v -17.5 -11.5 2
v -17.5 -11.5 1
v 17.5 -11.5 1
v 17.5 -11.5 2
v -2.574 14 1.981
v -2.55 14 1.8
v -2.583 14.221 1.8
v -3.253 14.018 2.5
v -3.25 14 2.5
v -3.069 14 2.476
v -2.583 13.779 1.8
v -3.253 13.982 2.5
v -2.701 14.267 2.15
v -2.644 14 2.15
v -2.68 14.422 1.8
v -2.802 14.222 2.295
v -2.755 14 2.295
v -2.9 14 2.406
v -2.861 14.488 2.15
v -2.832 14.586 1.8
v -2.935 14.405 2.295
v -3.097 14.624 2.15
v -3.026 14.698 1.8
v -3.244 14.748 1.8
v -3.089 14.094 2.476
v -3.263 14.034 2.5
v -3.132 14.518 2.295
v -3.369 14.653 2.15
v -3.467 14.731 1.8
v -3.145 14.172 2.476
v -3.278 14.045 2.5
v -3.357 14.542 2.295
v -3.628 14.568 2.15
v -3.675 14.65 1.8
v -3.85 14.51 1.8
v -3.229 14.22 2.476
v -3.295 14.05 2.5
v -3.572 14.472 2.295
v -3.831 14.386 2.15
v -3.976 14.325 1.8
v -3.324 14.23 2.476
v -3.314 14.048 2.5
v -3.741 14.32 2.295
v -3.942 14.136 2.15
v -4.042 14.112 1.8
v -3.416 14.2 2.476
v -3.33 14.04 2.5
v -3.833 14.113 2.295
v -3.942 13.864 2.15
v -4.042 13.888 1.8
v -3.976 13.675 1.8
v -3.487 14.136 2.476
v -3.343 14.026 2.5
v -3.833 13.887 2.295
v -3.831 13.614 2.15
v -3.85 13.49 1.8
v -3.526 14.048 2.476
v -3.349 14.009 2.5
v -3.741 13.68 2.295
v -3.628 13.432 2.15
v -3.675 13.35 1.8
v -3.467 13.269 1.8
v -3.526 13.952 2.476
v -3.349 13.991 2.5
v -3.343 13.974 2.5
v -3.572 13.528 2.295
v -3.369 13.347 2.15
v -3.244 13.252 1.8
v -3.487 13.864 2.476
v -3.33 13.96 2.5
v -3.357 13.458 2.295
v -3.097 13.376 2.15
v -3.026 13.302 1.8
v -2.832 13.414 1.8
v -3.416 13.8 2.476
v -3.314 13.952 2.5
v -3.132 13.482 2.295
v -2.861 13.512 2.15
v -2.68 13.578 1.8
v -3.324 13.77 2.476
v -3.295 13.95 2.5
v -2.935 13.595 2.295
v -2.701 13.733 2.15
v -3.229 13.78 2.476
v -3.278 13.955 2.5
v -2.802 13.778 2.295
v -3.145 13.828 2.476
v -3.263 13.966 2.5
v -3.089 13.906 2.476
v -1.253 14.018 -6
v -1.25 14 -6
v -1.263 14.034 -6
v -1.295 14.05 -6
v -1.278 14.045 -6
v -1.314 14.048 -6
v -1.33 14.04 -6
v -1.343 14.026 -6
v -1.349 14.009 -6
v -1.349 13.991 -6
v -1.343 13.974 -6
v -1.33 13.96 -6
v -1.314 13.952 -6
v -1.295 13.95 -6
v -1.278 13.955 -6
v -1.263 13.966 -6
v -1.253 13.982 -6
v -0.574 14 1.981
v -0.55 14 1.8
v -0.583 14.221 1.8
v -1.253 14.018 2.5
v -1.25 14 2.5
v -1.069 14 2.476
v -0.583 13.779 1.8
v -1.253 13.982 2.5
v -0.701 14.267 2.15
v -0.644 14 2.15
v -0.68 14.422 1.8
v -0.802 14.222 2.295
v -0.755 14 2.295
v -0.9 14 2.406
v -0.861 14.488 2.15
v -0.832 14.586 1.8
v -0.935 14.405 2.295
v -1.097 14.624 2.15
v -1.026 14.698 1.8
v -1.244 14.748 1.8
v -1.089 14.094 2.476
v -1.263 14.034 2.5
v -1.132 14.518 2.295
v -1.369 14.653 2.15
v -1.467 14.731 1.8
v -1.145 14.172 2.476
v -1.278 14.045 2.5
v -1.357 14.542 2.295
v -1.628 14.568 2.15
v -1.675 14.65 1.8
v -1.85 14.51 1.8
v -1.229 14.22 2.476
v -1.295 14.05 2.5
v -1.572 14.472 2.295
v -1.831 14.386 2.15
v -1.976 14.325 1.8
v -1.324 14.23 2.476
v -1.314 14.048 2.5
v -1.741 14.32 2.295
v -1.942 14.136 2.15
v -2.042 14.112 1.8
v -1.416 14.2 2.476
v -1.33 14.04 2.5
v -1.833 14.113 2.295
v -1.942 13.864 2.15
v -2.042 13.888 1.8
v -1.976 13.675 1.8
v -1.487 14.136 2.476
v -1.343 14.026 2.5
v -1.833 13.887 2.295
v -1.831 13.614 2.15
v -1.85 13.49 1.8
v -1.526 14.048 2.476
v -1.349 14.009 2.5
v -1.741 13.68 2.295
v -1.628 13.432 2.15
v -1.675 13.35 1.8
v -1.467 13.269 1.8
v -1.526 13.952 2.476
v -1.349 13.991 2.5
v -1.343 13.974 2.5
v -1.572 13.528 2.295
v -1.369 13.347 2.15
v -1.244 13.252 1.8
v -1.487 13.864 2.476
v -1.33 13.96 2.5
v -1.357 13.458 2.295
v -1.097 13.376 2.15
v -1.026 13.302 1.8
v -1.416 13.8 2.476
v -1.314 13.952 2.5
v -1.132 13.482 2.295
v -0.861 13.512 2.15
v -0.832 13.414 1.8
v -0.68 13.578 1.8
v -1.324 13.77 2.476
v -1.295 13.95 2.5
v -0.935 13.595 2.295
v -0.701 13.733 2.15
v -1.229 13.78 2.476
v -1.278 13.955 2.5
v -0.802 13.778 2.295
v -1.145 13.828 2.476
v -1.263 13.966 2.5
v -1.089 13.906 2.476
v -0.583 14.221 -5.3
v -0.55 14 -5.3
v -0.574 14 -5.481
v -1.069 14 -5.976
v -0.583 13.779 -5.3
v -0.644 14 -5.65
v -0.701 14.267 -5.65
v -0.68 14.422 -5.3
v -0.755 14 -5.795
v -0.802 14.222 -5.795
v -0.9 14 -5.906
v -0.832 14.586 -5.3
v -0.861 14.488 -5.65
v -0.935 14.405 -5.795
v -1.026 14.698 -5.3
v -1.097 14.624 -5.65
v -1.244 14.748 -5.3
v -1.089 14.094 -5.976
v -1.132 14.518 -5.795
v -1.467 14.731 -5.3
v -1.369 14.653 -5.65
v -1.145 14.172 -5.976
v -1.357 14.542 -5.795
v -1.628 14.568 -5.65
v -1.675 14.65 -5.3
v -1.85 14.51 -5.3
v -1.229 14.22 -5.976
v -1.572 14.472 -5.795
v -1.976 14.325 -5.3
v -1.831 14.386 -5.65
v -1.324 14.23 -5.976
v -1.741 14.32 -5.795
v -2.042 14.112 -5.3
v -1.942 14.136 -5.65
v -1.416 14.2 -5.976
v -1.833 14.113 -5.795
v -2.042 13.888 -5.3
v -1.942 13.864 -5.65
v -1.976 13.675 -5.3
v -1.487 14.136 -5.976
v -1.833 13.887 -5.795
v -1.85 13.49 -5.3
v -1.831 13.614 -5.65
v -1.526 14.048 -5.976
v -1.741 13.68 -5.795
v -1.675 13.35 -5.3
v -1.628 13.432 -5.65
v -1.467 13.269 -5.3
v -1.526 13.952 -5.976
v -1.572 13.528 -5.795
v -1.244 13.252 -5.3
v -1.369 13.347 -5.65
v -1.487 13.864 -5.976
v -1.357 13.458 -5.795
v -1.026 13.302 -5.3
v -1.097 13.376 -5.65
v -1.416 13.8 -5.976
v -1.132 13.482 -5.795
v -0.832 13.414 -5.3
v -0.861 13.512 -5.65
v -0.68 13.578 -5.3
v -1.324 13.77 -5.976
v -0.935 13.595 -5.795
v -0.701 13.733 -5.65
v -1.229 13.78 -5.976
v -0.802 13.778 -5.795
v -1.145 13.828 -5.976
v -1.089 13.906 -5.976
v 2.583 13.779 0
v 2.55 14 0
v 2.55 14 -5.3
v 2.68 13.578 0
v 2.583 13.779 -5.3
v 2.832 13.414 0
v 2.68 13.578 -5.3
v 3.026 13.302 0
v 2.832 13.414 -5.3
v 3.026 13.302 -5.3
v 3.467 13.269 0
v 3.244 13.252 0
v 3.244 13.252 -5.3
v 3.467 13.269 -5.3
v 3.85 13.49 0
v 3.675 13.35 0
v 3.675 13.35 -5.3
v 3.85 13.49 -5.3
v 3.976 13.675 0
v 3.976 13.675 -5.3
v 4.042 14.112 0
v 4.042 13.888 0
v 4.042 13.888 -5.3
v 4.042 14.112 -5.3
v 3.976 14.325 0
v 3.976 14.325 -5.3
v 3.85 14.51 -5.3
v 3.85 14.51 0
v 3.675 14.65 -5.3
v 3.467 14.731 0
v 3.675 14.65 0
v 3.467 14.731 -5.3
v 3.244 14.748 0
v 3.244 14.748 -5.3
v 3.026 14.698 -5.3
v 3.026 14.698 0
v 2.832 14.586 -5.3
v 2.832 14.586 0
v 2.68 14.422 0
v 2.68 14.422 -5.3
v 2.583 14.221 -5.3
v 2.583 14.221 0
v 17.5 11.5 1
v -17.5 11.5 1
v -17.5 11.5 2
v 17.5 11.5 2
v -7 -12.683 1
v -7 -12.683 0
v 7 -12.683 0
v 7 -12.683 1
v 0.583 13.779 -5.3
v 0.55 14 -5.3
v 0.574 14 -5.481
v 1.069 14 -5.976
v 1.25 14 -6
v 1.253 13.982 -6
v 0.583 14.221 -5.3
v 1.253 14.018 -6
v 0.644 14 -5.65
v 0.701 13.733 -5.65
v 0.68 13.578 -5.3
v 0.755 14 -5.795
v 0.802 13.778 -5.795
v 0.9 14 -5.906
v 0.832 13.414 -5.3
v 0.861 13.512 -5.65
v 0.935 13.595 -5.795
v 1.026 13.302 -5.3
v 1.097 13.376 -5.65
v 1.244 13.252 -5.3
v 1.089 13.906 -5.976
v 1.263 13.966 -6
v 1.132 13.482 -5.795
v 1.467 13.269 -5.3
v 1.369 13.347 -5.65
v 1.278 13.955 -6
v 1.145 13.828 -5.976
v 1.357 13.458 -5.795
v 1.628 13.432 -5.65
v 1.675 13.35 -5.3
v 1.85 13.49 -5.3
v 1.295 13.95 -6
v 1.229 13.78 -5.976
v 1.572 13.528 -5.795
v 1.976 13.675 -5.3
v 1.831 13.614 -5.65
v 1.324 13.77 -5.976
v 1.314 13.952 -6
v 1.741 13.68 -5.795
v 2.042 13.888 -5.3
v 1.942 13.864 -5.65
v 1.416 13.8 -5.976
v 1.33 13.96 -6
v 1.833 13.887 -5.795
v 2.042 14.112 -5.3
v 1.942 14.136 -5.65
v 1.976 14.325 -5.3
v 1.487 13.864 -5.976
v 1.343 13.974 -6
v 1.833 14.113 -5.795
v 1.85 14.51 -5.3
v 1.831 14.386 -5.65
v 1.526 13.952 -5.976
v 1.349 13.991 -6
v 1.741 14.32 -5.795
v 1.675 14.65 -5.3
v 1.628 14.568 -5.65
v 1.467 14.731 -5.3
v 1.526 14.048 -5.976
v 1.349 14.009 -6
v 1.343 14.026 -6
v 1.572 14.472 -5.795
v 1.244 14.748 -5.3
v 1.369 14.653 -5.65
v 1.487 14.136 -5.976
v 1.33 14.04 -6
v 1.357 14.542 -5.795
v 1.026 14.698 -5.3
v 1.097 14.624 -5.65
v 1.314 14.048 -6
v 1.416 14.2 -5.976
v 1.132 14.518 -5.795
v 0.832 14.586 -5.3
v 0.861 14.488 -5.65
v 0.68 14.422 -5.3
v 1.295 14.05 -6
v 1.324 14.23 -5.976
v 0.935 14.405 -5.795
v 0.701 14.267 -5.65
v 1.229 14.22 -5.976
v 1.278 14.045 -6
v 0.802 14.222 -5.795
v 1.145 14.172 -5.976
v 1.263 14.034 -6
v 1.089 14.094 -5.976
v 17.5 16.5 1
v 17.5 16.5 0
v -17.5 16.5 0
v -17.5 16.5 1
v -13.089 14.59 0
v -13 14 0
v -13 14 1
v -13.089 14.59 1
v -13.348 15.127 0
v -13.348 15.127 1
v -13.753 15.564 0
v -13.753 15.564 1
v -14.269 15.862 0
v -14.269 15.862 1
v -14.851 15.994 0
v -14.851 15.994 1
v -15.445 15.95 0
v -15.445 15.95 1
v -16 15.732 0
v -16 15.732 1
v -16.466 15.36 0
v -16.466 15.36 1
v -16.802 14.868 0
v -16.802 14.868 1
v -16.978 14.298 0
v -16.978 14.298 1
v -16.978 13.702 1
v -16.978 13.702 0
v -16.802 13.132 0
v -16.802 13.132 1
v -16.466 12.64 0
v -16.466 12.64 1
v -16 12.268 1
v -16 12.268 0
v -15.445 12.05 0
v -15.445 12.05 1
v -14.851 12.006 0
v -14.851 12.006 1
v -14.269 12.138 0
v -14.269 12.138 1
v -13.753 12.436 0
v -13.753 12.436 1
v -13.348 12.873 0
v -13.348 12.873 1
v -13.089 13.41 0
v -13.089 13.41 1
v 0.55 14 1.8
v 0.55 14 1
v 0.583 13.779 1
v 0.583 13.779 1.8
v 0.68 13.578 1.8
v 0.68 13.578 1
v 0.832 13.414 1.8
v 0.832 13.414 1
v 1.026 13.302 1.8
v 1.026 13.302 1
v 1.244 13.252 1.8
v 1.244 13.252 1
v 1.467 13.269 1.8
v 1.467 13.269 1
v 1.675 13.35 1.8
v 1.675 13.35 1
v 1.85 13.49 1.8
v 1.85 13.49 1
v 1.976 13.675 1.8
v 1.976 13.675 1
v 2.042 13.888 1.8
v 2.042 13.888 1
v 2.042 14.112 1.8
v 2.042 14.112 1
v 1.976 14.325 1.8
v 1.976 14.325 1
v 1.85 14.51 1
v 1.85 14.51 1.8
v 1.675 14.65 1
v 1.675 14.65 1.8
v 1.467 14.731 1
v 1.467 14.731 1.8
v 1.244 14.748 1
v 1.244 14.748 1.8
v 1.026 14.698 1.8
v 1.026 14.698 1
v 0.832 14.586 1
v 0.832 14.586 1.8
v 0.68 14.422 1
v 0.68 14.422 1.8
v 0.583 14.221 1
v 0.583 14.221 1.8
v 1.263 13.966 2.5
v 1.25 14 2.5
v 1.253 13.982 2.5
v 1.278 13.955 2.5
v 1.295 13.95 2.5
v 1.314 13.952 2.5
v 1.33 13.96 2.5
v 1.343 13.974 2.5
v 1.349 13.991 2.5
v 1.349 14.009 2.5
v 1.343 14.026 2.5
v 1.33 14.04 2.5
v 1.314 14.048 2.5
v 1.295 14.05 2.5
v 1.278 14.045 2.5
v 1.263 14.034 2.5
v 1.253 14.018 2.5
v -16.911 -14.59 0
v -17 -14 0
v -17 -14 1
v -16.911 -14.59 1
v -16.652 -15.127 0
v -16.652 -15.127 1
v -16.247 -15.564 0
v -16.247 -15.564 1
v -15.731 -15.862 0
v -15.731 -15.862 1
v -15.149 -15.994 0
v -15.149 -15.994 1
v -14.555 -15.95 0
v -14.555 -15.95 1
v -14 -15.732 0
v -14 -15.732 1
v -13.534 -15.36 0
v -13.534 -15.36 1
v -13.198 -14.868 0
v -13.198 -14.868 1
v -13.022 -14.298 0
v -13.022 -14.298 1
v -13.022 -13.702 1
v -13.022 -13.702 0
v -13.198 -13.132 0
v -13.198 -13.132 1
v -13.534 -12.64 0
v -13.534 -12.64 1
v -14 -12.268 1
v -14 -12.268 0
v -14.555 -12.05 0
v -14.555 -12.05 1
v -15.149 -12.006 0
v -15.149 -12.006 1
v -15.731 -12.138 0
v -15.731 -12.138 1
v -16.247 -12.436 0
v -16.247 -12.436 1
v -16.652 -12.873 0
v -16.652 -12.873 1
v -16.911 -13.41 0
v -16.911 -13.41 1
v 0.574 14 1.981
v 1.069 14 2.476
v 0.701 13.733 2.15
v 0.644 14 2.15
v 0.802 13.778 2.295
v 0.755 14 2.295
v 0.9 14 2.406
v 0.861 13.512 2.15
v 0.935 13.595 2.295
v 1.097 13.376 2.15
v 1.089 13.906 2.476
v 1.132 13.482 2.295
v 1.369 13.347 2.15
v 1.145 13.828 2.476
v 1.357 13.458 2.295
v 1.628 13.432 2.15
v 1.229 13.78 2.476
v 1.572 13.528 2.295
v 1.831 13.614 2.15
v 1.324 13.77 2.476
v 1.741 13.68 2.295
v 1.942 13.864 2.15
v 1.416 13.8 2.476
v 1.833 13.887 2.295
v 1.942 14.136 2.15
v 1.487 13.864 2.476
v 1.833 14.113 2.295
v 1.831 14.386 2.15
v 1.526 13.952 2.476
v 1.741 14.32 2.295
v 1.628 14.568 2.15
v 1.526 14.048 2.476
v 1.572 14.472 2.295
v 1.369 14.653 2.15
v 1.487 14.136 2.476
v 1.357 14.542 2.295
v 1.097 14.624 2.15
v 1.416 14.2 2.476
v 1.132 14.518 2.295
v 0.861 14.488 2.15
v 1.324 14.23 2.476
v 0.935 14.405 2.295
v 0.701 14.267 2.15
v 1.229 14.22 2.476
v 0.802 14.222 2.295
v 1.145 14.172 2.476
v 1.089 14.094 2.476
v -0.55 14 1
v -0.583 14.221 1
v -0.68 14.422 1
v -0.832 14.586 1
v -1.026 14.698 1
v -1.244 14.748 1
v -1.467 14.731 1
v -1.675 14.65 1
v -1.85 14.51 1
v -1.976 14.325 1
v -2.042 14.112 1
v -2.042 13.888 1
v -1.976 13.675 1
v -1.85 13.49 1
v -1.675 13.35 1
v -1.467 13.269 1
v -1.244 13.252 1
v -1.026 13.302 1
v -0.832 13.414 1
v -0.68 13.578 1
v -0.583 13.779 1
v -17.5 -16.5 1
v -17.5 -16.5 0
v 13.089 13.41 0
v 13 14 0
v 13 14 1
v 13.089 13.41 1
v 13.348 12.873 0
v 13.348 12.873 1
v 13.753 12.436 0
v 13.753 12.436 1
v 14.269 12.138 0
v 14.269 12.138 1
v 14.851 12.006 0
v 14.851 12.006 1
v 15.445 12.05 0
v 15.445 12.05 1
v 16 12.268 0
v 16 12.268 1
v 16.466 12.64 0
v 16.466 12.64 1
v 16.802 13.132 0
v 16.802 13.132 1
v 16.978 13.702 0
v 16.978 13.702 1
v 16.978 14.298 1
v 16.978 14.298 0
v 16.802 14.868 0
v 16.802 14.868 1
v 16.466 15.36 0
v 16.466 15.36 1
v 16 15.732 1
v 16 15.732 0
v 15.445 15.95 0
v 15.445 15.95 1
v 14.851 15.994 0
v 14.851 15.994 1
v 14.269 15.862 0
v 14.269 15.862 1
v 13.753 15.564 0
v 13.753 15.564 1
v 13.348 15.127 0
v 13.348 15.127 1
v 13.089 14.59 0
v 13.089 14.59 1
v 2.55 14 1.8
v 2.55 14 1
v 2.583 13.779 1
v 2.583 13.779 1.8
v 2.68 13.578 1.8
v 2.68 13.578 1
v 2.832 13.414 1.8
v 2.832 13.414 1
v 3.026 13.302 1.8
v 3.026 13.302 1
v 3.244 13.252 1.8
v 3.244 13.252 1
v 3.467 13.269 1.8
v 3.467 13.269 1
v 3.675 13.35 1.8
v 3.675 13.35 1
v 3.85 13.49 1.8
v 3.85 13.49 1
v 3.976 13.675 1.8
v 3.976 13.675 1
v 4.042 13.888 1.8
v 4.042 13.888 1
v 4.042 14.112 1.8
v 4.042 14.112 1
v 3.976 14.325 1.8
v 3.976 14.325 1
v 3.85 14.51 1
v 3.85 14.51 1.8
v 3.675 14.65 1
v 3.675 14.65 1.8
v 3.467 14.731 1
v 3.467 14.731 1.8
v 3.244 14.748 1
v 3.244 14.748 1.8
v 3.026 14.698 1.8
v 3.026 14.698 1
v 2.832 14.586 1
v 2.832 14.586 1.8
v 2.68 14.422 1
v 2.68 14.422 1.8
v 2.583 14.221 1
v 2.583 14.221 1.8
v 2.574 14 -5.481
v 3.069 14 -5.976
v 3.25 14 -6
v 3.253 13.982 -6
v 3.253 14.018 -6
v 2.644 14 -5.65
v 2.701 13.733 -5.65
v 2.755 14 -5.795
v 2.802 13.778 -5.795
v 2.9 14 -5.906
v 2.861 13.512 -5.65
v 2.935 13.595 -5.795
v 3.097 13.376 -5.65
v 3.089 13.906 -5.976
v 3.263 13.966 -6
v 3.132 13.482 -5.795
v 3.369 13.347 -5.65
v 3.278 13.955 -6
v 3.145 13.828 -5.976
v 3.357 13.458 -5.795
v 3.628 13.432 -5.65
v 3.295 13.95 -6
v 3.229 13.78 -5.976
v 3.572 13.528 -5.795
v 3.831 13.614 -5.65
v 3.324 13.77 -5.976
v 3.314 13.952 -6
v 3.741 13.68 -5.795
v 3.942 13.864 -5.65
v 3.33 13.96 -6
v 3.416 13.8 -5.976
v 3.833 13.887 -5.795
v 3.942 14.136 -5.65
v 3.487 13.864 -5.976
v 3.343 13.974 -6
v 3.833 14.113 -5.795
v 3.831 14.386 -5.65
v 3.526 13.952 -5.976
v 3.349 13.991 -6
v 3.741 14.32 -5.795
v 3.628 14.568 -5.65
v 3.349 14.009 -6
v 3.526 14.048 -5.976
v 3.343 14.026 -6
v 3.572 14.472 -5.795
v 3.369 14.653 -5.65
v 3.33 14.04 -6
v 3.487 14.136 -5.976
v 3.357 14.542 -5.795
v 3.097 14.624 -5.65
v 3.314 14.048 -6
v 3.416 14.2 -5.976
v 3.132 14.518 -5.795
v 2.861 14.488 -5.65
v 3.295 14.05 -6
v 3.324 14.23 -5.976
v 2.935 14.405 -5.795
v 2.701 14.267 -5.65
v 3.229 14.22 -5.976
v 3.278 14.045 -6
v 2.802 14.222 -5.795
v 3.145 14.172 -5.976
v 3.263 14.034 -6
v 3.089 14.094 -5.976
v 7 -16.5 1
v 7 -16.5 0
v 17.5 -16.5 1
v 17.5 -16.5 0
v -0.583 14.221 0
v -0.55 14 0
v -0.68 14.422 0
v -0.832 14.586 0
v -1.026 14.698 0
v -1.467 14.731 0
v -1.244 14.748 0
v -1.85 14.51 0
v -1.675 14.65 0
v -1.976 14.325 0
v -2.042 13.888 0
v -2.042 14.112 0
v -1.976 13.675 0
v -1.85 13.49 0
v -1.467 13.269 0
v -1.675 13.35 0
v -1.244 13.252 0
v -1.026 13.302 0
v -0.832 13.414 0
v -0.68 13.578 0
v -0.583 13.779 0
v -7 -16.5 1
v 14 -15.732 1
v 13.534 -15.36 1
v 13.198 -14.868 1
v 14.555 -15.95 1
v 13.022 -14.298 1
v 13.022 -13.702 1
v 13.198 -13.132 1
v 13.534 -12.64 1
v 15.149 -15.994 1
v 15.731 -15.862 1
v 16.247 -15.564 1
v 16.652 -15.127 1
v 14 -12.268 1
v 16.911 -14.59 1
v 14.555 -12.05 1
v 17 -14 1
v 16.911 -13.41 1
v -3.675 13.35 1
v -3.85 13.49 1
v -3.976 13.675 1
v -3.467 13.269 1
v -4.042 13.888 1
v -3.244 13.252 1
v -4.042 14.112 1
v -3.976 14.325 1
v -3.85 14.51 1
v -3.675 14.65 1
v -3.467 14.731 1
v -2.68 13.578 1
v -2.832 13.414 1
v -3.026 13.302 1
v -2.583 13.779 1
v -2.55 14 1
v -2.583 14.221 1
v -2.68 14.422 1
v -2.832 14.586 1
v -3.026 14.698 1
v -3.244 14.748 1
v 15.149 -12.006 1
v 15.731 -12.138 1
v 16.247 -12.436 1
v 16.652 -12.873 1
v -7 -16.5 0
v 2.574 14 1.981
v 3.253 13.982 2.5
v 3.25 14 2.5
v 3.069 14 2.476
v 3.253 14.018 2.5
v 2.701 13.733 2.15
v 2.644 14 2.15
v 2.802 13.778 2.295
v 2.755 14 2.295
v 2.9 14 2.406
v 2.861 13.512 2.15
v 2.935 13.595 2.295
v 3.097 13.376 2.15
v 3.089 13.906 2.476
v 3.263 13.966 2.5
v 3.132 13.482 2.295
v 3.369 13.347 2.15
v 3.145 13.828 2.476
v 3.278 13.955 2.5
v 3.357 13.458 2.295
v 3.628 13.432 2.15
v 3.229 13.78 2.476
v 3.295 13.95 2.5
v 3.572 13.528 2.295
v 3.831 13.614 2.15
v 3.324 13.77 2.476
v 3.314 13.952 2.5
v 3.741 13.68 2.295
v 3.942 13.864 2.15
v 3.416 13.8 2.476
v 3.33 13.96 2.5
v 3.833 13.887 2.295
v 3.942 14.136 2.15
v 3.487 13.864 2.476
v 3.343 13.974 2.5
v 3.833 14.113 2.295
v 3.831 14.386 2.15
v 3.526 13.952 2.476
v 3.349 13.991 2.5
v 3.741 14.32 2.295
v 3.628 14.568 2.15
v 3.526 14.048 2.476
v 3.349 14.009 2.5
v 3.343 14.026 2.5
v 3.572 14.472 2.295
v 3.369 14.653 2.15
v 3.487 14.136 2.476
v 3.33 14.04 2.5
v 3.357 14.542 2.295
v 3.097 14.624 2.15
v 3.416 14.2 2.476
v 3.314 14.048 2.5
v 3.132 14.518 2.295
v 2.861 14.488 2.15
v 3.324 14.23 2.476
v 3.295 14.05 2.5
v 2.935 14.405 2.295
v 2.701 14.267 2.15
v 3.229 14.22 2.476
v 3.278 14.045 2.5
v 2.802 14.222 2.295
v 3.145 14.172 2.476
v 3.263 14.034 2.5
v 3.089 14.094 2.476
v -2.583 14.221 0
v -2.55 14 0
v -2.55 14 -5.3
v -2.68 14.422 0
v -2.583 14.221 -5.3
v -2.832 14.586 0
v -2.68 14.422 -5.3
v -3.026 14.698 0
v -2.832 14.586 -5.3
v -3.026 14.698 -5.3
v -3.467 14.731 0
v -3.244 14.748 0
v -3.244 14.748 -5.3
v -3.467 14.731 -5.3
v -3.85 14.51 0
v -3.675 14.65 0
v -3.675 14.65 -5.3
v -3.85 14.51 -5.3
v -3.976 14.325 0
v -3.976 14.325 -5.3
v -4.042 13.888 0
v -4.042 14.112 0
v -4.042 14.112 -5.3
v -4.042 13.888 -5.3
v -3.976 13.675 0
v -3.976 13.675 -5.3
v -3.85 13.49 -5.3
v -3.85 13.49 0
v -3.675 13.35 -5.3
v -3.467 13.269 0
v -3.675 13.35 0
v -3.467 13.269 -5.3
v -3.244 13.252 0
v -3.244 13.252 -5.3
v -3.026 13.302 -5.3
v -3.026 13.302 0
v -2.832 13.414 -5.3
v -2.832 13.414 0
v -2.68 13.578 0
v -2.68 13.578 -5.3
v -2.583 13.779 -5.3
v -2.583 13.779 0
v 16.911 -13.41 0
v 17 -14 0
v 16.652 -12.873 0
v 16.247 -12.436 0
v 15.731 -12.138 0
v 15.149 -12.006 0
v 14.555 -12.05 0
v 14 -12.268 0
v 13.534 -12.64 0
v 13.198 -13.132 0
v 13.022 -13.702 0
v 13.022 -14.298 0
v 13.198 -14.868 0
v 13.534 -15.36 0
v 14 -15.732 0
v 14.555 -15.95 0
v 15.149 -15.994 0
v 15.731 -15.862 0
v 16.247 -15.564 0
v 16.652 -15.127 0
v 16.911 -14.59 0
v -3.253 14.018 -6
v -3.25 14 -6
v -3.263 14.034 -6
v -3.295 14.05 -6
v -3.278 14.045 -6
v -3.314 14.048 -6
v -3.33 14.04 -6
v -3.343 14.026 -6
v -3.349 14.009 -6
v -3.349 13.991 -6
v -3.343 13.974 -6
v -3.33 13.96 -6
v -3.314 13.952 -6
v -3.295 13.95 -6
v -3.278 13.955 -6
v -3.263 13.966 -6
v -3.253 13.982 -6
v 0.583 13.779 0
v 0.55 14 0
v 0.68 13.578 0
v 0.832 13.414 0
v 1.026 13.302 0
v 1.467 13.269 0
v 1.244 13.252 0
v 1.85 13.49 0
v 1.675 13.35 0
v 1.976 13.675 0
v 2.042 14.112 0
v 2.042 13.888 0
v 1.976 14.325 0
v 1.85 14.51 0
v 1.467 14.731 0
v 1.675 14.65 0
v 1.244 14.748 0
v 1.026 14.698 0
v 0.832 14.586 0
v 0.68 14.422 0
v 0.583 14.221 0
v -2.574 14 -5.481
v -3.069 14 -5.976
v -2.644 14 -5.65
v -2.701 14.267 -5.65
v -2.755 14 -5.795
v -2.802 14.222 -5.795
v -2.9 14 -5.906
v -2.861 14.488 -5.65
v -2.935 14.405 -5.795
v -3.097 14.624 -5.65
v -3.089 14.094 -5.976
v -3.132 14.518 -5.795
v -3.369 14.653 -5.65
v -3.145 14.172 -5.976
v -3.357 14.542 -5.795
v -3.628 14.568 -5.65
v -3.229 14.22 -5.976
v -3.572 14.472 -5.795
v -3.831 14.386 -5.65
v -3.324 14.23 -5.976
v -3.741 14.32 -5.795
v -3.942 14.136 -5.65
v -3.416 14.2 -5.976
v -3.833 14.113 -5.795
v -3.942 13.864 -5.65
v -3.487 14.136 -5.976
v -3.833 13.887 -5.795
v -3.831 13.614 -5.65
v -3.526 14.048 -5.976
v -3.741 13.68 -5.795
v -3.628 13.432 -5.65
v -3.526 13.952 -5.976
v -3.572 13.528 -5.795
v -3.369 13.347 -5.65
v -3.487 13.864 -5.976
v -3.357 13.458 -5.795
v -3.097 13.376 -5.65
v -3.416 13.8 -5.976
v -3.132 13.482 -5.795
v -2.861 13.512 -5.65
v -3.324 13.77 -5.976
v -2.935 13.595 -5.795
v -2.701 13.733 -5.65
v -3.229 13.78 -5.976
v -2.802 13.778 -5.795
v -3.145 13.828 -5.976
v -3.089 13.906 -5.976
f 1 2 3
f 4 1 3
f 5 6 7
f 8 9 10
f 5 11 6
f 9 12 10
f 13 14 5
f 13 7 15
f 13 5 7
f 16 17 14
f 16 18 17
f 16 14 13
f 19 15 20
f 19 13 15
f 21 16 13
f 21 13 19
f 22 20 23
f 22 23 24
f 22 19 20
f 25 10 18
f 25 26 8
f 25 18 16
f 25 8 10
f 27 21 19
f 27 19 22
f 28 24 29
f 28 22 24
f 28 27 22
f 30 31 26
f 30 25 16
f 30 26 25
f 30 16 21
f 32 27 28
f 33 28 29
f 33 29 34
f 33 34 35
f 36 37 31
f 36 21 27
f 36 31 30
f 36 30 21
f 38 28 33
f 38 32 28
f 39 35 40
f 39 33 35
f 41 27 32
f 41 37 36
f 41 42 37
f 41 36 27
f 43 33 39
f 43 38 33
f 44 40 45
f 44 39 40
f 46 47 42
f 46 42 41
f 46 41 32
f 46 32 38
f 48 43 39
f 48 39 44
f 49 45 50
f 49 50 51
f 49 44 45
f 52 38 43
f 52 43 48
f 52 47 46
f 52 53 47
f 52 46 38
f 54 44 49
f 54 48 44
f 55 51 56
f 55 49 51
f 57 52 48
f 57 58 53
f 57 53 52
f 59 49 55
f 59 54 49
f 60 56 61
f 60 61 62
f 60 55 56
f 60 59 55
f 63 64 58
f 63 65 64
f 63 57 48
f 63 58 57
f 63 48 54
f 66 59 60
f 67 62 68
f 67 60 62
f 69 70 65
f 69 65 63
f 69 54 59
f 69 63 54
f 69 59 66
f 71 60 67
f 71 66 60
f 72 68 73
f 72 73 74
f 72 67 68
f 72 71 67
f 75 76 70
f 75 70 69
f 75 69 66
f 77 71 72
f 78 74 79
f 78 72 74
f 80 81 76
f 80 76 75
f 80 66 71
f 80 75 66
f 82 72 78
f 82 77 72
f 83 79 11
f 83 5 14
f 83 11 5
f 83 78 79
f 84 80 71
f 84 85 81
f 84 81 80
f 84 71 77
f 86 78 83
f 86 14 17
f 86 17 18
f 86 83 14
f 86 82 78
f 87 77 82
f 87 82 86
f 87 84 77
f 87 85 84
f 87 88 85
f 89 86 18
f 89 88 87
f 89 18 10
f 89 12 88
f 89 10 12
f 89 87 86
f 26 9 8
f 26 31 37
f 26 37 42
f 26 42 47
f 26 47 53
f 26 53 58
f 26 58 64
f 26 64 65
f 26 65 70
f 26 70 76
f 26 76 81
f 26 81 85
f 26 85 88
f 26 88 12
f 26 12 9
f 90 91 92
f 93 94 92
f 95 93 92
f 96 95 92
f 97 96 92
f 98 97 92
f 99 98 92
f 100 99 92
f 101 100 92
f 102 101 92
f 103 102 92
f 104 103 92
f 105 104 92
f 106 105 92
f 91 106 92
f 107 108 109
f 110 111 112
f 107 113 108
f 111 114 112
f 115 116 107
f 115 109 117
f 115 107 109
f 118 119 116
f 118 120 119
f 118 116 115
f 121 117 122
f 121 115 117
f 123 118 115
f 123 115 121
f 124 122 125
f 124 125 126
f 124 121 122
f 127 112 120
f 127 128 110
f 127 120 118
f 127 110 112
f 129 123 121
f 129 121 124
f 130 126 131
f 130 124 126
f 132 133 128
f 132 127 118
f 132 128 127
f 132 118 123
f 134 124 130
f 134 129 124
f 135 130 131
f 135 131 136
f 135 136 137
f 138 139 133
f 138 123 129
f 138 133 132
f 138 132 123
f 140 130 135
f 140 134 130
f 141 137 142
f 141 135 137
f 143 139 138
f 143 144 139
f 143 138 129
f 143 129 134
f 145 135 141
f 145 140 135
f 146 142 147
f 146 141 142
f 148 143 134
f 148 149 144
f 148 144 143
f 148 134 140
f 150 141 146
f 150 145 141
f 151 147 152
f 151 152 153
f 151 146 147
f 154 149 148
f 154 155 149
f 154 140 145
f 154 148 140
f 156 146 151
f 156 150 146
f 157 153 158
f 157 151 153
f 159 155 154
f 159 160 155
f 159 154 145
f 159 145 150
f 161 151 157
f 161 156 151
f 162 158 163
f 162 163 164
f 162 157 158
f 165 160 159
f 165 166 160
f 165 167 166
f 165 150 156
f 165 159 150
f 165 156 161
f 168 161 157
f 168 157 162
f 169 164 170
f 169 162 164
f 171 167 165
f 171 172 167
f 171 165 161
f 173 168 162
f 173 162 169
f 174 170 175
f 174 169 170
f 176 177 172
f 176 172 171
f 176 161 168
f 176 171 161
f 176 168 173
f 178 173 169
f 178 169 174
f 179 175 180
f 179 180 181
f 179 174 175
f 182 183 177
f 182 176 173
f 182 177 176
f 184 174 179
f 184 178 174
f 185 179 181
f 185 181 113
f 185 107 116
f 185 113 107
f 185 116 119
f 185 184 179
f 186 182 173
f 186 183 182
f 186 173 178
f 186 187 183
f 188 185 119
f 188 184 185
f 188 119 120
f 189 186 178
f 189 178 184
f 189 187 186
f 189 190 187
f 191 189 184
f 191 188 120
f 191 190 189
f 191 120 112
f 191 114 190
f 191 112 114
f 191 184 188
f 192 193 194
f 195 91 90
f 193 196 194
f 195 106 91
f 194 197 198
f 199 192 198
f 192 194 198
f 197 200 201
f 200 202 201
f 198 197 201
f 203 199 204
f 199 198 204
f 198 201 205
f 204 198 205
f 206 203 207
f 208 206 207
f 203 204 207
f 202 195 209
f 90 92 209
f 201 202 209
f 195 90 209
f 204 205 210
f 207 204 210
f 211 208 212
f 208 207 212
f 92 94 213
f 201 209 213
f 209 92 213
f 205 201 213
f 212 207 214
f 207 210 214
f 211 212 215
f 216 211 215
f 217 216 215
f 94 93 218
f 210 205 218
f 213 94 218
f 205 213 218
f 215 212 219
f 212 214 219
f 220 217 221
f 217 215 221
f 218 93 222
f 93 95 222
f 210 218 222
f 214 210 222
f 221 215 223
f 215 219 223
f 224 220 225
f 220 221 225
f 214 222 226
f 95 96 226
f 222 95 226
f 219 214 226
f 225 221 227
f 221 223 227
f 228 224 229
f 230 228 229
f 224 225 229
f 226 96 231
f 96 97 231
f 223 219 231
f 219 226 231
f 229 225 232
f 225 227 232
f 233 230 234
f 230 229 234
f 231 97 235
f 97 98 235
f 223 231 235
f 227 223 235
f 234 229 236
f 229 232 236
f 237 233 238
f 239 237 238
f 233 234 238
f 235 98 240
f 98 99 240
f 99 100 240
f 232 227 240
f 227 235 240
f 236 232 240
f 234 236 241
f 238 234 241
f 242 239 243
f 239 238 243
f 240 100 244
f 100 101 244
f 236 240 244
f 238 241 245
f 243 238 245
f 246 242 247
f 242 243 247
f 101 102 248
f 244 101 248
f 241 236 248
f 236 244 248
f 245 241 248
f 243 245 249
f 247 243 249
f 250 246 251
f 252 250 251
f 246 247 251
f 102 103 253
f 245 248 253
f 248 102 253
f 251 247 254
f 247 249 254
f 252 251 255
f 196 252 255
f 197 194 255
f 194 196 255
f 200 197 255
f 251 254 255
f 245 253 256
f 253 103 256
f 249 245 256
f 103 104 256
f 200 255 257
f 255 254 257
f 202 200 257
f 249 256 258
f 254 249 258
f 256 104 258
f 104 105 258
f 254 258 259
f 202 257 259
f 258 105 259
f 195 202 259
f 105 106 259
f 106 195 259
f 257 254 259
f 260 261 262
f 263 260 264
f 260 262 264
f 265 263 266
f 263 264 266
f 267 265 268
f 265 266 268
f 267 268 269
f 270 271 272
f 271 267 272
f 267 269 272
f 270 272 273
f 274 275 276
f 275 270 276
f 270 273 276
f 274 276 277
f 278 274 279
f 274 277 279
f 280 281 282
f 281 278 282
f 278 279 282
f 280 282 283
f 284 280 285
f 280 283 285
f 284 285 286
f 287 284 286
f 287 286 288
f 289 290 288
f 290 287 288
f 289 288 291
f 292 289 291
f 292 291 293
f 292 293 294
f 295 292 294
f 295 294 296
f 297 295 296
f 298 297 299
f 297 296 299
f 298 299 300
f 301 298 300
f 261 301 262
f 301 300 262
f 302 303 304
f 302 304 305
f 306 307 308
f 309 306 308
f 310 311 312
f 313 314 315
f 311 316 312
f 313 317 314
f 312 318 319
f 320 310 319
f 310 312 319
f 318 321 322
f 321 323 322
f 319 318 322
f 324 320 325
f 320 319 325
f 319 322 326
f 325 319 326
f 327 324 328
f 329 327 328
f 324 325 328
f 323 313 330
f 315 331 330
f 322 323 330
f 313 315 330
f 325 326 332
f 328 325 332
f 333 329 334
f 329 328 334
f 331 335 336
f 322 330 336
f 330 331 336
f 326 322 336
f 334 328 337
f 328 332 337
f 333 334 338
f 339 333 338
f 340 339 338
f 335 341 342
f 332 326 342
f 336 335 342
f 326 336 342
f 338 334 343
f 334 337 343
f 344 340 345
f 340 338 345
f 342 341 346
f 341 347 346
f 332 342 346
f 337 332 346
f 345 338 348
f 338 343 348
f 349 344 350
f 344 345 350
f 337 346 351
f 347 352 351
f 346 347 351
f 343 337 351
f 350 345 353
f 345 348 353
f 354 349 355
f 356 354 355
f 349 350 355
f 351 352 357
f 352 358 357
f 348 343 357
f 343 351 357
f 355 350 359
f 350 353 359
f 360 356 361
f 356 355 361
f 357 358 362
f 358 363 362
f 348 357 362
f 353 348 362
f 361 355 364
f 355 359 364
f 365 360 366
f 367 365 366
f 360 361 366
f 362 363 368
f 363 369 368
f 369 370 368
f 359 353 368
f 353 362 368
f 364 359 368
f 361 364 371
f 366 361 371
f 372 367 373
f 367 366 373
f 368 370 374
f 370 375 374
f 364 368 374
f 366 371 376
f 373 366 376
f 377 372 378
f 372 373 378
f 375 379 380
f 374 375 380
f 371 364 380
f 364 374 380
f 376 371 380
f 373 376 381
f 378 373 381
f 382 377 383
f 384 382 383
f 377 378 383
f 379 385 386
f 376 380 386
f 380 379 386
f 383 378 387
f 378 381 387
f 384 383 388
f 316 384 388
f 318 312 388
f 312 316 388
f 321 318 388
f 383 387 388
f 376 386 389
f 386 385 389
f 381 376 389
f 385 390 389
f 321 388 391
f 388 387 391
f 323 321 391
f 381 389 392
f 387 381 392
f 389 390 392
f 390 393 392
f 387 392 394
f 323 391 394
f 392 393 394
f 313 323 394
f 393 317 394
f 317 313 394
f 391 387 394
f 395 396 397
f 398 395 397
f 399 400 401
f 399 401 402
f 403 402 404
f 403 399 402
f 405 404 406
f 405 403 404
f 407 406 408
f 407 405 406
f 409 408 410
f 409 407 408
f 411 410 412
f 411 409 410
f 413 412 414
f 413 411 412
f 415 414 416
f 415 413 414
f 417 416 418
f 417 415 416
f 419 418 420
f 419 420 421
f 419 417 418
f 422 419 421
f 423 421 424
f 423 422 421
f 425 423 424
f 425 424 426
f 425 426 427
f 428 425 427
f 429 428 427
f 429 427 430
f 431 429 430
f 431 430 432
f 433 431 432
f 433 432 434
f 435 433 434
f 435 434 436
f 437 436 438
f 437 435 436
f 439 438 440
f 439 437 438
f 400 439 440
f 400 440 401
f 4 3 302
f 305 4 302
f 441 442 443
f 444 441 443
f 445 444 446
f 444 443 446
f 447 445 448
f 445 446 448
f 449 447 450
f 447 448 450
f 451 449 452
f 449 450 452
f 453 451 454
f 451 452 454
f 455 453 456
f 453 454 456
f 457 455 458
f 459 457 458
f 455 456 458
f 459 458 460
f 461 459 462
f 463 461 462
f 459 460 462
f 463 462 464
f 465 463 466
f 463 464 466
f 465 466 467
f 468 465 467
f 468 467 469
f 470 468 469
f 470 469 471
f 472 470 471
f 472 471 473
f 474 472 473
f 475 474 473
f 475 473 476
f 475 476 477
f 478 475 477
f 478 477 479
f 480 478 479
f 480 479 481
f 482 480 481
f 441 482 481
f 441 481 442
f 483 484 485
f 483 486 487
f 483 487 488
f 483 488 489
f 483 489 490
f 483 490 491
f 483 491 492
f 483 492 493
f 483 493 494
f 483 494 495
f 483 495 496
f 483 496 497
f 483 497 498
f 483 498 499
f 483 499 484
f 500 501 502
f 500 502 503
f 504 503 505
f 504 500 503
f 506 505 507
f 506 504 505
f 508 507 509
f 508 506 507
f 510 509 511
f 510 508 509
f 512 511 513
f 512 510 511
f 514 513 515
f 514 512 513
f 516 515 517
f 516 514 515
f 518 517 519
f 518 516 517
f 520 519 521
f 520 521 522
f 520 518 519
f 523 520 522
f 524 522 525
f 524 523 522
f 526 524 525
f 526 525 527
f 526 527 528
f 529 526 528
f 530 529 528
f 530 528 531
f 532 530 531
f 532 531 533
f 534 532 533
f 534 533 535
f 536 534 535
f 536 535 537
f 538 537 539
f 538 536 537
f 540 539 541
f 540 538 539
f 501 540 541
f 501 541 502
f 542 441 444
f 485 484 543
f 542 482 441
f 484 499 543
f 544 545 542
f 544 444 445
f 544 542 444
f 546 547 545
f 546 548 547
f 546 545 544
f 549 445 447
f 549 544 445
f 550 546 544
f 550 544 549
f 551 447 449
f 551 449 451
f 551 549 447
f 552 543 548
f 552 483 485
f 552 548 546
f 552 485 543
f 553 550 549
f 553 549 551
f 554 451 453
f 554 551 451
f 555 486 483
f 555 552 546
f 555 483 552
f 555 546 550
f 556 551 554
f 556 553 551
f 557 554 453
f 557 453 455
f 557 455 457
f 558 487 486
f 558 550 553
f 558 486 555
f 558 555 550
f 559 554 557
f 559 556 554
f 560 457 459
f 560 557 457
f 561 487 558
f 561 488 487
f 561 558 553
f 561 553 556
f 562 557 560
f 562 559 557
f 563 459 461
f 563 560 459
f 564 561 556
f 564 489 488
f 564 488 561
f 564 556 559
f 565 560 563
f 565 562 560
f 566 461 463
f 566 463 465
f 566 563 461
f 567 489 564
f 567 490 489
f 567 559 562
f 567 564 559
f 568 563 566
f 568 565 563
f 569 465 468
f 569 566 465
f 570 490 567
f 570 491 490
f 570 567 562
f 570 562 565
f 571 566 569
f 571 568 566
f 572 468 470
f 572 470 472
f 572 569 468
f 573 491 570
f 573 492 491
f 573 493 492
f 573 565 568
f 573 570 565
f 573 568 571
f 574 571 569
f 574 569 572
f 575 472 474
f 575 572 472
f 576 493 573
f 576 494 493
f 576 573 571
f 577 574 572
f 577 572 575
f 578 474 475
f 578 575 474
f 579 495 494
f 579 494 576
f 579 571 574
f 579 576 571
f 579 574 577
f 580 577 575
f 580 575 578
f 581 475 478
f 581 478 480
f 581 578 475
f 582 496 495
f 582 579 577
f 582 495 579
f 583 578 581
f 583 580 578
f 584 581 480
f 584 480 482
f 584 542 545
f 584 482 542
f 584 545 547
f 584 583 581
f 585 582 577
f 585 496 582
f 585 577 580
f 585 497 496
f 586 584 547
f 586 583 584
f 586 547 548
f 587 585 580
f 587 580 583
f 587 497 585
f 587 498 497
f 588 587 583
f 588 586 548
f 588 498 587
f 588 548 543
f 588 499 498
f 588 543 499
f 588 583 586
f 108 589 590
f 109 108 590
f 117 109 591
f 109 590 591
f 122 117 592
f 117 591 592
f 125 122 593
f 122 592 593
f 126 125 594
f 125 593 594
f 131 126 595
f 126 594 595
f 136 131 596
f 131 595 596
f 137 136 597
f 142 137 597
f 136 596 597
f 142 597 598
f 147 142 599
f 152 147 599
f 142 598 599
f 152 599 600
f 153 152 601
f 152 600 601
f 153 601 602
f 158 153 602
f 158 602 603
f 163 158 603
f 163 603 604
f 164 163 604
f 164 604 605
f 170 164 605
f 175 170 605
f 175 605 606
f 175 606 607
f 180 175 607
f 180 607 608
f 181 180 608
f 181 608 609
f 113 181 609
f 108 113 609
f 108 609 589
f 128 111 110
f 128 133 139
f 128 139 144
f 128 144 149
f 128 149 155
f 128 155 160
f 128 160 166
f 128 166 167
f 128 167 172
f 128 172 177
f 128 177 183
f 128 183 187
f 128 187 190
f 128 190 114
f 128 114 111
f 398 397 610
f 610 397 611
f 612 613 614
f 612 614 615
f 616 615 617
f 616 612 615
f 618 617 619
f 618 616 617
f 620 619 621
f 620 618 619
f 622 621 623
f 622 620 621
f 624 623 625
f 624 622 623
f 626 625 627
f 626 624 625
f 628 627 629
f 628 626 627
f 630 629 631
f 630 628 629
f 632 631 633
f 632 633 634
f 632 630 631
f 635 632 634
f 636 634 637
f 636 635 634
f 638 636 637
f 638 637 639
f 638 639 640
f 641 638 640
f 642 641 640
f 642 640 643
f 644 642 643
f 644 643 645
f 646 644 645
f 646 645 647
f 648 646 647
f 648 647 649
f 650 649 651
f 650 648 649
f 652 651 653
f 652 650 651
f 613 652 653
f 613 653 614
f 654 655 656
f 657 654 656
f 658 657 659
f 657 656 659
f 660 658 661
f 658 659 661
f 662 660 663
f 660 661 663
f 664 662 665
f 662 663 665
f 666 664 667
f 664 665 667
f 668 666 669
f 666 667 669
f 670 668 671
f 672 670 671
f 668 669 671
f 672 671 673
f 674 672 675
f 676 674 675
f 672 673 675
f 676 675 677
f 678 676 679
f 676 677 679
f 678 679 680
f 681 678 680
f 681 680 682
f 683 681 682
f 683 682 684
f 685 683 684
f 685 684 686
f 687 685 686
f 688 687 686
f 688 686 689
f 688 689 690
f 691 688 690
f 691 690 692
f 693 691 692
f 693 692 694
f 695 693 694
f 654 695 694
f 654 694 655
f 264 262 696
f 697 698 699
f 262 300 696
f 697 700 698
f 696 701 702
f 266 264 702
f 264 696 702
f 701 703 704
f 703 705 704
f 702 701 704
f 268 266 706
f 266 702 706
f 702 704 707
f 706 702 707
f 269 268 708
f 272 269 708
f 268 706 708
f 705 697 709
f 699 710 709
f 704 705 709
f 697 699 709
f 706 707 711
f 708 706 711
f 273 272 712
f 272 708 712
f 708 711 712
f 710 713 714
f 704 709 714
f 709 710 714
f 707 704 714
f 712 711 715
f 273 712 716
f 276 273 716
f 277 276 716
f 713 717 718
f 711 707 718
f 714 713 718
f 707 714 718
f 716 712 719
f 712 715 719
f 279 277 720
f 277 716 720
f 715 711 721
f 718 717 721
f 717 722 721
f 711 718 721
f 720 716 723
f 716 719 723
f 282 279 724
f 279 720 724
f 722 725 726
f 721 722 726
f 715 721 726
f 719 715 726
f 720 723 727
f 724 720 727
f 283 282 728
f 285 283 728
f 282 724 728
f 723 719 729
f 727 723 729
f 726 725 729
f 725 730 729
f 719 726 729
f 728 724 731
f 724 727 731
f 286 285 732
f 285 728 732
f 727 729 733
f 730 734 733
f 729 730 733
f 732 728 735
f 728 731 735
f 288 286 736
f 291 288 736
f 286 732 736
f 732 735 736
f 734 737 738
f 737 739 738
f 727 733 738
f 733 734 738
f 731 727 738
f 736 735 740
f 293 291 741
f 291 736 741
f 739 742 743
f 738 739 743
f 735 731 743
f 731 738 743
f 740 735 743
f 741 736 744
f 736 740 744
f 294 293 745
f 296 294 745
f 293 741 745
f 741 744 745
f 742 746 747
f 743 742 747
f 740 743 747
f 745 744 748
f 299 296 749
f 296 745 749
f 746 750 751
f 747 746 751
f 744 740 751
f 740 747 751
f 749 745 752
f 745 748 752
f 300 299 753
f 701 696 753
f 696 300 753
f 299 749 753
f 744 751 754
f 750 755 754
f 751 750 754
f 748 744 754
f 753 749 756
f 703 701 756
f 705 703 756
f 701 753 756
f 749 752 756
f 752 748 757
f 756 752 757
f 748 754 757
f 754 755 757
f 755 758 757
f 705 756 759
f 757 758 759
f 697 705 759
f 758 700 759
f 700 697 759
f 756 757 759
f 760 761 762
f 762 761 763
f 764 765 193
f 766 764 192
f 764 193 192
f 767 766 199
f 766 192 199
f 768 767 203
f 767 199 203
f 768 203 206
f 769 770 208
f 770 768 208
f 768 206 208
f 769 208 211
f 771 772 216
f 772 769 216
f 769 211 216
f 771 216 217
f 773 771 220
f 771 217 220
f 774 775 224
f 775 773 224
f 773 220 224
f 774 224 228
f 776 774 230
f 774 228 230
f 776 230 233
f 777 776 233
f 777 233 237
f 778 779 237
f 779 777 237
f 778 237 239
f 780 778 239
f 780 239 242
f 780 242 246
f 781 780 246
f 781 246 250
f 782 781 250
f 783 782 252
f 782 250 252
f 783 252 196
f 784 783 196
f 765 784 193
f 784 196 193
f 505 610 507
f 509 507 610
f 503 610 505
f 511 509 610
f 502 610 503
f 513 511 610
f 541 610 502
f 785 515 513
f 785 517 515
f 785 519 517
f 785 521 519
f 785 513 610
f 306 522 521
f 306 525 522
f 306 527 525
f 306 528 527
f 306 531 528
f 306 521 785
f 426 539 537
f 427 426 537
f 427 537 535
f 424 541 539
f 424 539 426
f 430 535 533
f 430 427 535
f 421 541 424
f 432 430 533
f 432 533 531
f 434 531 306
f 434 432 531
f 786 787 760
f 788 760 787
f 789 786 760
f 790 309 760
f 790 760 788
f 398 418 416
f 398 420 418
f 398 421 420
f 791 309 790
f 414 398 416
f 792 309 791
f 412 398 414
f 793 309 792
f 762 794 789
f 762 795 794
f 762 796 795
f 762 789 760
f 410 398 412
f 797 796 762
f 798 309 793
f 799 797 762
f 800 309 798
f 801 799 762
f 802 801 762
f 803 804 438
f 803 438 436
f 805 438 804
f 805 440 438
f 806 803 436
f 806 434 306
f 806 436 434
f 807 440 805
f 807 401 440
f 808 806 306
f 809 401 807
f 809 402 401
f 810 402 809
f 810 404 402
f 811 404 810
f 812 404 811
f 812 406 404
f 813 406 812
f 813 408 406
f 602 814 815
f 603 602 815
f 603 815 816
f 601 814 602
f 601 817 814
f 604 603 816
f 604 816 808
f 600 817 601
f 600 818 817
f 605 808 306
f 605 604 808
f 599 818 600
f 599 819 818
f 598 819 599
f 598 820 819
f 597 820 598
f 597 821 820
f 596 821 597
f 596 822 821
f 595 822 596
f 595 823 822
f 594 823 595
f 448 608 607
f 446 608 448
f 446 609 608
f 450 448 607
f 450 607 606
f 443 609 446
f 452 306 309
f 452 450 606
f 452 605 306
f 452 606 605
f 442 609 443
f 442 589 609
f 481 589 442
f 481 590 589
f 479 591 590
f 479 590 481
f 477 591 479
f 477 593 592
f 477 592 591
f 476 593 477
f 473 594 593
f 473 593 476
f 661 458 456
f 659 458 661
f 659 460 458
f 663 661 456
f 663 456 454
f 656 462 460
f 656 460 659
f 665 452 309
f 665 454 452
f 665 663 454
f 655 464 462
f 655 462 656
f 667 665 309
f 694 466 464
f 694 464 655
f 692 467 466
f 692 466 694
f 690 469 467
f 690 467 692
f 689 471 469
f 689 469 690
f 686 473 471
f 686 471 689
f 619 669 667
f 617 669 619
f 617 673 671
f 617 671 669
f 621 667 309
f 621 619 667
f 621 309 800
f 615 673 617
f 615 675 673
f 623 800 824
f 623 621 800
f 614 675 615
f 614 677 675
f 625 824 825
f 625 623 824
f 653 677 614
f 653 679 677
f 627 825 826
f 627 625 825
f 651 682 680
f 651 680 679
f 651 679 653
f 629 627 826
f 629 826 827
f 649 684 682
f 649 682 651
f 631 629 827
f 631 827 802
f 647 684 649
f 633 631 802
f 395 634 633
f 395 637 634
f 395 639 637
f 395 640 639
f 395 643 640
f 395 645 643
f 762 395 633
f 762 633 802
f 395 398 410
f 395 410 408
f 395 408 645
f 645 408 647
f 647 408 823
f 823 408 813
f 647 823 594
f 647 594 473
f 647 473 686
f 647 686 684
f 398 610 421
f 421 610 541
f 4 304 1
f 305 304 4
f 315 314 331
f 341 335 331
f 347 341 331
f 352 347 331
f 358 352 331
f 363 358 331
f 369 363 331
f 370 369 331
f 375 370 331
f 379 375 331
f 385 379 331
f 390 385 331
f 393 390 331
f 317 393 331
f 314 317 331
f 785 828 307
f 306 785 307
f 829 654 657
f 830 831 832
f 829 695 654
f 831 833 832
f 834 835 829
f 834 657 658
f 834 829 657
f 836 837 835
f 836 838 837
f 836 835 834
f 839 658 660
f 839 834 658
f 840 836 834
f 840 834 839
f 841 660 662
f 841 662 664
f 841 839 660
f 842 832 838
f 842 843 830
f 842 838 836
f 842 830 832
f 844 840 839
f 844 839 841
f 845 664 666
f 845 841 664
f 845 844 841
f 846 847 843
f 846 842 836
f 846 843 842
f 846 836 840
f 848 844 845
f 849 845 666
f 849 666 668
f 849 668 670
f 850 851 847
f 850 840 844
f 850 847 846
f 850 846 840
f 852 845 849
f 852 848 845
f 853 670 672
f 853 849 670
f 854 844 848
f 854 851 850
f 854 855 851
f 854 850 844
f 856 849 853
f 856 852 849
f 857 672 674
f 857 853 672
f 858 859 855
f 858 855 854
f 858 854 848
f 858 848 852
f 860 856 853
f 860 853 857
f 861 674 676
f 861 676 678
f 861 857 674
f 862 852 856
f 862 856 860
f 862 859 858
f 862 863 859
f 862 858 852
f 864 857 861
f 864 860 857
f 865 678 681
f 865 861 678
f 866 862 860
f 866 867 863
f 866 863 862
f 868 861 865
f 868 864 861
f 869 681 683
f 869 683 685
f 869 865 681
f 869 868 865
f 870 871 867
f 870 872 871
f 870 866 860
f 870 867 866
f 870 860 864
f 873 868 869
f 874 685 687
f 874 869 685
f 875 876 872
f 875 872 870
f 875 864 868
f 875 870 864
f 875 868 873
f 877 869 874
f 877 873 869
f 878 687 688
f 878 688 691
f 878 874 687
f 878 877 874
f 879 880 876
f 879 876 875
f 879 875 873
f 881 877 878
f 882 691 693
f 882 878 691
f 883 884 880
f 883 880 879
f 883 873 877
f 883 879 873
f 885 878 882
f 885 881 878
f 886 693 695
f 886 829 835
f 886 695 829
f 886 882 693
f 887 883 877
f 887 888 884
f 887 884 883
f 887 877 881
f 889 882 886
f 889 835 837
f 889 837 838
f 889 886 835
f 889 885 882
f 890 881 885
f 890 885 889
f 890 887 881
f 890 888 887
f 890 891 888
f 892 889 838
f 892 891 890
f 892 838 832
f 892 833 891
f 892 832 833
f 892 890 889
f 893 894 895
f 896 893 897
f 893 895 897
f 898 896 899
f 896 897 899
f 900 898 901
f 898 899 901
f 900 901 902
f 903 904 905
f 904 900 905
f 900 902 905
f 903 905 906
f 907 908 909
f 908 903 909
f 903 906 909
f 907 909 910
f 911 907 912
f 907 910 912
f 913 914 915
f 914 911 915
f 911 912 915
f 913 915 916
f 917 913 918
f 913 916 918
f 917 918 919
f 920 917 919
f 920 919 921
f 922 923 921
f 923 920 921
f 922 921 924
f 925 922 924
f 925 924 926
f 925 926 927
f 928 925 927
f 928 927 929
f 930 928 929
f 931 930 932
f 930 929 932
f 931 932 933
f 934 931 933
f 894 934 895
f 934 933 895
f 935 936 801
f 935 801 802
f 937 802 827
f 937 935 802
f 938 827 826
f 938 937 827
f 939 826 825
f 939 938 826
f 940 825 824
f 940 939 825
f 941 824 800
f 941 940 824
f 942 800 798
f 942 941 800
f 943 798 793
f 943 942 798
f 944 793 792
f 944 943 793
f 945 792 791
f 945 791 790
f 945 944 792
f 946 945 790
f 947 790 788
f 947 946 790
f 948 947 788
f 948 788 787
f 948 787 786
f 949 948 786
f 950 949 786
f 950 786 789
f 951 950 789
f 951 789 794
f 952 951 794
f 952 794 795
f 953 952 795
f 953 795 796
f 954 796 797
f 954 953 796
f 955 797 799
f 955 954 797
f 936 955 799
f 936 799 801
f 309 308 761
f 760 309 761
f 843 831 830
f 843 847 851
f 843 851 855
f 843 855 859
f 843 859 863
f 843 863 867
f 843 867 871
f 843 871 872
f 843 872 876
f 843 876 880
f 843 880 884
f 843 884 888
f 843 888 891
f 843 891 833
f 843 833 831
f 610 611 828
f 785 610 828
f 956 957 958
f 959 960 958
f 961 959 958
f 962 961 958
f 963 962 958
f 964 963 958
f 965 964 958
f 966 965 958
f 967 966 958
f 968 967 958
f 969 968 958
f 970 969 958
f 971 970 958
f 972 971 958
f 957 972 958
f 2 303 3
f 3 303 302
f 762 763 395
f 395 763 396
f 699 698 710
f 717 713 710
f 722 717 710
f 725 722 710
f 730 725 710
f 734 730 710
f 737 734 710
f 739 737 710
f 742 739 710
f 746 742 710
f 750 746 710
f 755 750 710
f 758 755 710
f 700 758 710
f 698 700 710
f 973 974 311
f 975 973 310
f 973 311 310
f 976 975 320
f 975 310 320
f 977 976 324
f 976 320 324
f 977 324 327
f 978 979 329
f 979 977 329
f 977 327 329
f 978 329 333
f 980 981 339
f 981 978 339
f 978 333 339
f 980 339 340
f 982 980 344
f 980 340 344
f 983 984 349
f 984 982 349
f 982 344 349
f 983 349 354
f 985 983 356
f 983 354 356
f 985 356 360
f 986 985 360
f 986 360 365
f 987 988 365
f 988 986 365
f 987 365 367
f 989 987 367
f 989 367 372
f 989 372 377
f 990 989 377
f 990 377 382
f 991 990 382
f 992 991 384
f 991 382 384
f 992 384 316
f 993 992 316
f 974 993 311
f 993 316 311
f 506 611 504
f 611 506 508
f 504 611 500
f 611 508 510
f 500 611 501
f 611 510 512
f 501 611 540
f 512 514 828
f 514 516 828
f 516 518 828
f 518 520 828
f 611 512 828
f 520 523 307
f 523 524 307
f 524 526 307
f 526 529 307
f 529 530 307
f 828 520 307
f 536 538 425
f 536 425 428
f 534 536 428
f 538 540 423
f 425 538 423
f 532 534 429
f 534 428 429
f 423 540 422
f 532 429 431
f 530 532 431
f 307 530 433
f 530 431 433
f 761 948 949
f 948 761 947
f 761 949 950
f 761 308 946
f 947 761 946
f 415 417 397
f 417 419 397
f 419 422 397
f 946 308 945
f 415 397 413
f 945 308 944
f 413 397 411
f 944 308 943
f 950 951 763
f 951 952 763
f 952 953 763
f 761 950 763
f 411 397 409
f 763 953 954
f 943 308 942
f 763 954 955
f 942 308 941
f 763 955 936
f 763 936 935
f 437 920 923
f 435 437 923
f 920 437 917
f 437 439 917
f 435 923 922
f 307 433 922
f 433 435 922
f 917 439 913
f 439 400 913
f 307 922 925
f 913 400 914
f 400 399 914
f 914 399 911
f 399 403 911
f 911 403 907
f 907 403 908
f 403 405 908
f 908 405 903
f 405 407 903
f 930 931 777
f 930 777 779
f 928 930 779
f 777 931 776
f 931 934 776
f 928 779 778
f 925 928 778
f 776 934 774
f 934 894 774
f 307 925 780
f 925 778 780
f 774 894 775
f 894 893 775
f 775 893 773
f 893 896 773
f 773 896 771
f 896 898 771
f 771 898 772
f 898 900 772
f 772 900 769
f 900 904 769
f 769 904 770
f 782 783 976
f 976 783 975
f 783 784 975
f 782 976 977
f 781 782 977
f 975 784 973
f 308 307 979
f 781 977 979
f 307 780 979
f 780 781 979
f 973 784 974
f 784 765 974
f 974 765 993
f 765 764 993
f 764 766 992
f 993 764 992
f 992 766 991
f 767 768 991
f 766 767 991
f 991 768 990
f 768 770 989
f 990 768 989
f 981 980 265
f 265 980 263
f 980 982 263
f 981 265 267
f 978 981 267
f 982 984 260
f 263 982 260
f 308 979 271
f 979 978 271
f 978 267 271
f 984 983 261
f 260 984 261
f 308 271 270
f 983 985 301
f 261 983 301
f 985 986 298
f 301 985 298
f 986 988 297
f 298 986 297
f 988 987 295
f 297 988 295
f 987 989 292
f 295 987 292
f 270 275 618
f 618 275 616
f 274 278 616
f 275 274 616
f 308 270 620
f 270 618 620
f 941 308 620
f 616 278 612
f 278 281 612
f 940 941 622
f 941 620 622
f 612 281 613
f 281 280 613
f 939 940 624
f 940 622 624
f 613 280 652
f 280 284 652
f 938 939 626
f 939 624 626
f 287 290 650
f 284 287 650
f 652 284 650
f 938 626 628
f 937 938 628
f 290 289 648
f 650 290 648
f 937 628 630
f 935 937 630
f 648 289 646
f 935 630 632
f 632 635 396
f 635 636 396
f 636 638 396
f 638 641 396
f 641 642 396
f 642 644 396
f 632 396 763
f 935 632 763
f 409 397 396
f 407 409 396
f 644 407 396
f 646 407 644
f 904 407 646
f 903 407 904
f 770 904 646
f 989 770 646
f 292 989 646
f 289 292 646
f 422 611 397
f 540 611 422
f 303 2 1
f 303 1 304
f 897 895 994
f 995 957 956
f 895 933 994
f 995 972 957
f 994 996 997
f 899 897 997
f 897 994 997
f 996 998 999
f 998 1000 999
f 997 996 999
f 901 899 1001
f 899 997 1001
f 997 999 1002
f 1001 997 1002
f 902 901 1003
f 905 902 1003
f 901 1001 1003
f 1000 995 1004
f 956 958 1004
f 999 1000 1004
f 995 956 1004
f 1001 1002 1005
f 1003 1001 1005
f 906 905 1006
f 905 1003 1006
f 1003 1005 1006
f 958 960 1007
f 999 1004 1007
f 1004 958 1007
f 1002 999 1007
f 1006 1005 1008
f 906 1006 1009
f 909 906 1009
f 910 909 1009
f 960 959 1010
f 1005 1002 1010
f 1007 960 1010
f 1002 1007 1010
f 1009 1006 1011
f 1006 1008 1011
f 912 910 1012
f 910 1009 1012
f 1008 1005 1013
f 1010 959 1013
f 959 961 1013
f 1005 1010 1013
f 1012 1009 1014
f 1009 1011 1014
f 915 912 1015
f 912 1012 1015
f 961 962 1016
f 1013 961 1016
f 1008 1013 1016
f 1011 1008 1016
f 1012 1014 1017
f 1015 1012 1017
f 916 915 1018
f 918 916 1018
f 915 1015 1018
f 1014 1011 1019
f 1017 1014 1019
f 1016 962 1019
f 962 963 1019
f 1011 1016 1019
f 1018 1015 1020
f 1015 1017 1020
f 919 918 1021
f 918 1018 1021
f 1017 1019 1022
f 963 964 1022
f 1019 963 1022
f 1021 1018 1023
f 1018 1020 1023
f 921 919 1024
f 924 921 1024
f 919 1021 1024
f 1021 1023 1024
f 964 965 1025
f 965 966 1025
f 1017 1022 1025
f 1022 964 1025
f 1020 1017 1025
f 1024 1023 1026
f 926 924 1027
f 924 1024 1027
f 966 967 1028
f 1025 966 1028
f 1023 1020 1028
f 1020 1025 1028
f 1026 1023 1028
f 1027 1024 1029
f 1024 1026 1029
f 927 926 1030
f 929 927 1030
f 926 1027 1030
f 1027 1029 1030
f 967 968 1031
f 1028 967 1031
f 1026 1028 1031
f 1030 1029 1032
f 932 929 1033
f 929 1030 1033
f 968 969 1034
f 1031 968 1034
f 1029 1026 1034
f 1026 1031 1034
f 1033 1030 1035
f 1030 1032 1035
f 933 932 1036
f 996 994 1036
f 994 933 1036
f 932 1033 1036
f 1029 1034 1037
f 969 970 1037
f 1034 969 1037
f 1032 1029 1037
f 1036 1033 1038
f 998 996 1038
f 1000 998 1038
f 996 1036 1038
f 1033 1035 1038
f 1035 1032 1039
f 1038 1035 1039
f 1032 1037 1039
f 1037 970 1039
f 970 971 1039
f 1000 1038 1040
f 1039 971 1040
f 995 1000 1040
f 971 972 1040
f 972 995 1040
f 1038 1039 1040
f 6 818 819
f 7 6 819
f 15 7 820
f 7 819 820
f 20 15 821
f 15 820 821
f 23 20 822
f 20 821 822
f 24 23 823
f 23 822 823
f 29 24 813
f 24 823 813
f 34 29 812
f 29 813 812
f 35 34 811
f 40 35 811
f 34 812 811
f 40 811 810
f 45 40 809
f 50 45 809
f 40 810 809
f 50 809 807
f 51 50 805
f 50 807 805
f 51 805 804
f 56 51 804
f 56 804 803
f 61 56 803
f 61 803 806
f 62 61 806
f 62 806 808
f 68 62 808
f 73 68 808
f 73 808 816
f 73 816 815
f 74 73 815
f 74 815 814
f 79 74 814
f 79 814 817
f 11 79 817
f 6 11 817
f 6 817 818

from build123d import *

# Parameters (mm, degrees)
SKETCH1_R                = 2
BOSS_EXTRUDE1_DEPTH      = 1
SKETCH2_W                = 35
SKETCH2_H                = 23
BOSS_EXTRUDE2_DEPTH      = 1
BOSS_EXTRUDE3_DEPTH      = 0.5
BOSS_EXTRUDE3_DEPTH_BACK = 8
SKETCH3_R                = 0.75
FILLET1_R                = 0.7


with BuildPart() as part:
    # Sketch1 → Boss-Extrude1 (new body)
    with BuildSketch(Plane.XY):
        Polygon((-17.5, -16.5), (-7, -16.5), (-7, -12.68307554), (7, -12.68307554), (7, -16.5), (17.5, -16.5), (17.5, 16.5), (-17.5, 16.5), align=None)
        with Locations((-15, 14)):
            Circle(SKETCH1_R, mode=Mode.SUBTRACT)
        with Locations(Location((15, 14, 0), (0, 0, 180))):
            Circle(SKETCH1_R, mode=Mode.SUBTRACT)
        with Locations((15, -14)):
            Circle(SKETCH1_R, mode=Mode.SUBTRACT)
        with Locations(Location((-15, -14, 0), (0, 0, 180))):
            Circle(SKETCH1_R, mode=Mode.SUBTRACT)
    extrude(amount=BOSS_EXTRUDE1_DEPTH)

    # Sketch3 → Boss-Extrude3 (add, two sides: drawn at the far end of the back side and taken through both)
    with BuildSketch(Plane.XY.offset(2).offset(-BOSS_EXTRUDE3_DEPTH_BACK)):
        with Locations((-1.3, 14)):
            Circle(SKETCH3_R)
        with Locations((-3.3, 14)):
            Circle(SKETCH3_R)
        with Locations(Location((1.3, 14, 0), (0, 0, 180))):
            Circle(SKETCH3_R)
        with Locations(Location((3.3, 14, 0), (0, 0, 180))):
            Circle(SKETCH3_R)
    extrude(amount=BOSS_EXTRUDE3_DEPTH + BOSS_EXTRUDE3_DEPTH_BACK)

    # Fillet1
    fillet1_edges = [part.edges().sort_by_distance(p)[0] for p in [
        (-2.05, 14, -6),
        (-2.05, 14, 2.5),
        (-4.05, 14, -6),
        (-4.05, 14, 2.5),
        (2.05, 14, -6),
        (2.05, 14, 2.5),
        (4.05, 14, -6),
        (4.05, 14, 2.5),
    ]]
    fillet(fillet1_edges, radius=FILLET1_R)


with BuildPart() as body_2:
    # Sketch2 → Boss-Extrude2 (new body)
    with BuildSketch(Plane.XY.offset(1)):
        Rectangle(SKETCH2_W, SKETCH2_H)
    extrude(amount=BOSS_EXTRUDE2_DEPTH)


solid = Compound([part.part, body_2.part])
